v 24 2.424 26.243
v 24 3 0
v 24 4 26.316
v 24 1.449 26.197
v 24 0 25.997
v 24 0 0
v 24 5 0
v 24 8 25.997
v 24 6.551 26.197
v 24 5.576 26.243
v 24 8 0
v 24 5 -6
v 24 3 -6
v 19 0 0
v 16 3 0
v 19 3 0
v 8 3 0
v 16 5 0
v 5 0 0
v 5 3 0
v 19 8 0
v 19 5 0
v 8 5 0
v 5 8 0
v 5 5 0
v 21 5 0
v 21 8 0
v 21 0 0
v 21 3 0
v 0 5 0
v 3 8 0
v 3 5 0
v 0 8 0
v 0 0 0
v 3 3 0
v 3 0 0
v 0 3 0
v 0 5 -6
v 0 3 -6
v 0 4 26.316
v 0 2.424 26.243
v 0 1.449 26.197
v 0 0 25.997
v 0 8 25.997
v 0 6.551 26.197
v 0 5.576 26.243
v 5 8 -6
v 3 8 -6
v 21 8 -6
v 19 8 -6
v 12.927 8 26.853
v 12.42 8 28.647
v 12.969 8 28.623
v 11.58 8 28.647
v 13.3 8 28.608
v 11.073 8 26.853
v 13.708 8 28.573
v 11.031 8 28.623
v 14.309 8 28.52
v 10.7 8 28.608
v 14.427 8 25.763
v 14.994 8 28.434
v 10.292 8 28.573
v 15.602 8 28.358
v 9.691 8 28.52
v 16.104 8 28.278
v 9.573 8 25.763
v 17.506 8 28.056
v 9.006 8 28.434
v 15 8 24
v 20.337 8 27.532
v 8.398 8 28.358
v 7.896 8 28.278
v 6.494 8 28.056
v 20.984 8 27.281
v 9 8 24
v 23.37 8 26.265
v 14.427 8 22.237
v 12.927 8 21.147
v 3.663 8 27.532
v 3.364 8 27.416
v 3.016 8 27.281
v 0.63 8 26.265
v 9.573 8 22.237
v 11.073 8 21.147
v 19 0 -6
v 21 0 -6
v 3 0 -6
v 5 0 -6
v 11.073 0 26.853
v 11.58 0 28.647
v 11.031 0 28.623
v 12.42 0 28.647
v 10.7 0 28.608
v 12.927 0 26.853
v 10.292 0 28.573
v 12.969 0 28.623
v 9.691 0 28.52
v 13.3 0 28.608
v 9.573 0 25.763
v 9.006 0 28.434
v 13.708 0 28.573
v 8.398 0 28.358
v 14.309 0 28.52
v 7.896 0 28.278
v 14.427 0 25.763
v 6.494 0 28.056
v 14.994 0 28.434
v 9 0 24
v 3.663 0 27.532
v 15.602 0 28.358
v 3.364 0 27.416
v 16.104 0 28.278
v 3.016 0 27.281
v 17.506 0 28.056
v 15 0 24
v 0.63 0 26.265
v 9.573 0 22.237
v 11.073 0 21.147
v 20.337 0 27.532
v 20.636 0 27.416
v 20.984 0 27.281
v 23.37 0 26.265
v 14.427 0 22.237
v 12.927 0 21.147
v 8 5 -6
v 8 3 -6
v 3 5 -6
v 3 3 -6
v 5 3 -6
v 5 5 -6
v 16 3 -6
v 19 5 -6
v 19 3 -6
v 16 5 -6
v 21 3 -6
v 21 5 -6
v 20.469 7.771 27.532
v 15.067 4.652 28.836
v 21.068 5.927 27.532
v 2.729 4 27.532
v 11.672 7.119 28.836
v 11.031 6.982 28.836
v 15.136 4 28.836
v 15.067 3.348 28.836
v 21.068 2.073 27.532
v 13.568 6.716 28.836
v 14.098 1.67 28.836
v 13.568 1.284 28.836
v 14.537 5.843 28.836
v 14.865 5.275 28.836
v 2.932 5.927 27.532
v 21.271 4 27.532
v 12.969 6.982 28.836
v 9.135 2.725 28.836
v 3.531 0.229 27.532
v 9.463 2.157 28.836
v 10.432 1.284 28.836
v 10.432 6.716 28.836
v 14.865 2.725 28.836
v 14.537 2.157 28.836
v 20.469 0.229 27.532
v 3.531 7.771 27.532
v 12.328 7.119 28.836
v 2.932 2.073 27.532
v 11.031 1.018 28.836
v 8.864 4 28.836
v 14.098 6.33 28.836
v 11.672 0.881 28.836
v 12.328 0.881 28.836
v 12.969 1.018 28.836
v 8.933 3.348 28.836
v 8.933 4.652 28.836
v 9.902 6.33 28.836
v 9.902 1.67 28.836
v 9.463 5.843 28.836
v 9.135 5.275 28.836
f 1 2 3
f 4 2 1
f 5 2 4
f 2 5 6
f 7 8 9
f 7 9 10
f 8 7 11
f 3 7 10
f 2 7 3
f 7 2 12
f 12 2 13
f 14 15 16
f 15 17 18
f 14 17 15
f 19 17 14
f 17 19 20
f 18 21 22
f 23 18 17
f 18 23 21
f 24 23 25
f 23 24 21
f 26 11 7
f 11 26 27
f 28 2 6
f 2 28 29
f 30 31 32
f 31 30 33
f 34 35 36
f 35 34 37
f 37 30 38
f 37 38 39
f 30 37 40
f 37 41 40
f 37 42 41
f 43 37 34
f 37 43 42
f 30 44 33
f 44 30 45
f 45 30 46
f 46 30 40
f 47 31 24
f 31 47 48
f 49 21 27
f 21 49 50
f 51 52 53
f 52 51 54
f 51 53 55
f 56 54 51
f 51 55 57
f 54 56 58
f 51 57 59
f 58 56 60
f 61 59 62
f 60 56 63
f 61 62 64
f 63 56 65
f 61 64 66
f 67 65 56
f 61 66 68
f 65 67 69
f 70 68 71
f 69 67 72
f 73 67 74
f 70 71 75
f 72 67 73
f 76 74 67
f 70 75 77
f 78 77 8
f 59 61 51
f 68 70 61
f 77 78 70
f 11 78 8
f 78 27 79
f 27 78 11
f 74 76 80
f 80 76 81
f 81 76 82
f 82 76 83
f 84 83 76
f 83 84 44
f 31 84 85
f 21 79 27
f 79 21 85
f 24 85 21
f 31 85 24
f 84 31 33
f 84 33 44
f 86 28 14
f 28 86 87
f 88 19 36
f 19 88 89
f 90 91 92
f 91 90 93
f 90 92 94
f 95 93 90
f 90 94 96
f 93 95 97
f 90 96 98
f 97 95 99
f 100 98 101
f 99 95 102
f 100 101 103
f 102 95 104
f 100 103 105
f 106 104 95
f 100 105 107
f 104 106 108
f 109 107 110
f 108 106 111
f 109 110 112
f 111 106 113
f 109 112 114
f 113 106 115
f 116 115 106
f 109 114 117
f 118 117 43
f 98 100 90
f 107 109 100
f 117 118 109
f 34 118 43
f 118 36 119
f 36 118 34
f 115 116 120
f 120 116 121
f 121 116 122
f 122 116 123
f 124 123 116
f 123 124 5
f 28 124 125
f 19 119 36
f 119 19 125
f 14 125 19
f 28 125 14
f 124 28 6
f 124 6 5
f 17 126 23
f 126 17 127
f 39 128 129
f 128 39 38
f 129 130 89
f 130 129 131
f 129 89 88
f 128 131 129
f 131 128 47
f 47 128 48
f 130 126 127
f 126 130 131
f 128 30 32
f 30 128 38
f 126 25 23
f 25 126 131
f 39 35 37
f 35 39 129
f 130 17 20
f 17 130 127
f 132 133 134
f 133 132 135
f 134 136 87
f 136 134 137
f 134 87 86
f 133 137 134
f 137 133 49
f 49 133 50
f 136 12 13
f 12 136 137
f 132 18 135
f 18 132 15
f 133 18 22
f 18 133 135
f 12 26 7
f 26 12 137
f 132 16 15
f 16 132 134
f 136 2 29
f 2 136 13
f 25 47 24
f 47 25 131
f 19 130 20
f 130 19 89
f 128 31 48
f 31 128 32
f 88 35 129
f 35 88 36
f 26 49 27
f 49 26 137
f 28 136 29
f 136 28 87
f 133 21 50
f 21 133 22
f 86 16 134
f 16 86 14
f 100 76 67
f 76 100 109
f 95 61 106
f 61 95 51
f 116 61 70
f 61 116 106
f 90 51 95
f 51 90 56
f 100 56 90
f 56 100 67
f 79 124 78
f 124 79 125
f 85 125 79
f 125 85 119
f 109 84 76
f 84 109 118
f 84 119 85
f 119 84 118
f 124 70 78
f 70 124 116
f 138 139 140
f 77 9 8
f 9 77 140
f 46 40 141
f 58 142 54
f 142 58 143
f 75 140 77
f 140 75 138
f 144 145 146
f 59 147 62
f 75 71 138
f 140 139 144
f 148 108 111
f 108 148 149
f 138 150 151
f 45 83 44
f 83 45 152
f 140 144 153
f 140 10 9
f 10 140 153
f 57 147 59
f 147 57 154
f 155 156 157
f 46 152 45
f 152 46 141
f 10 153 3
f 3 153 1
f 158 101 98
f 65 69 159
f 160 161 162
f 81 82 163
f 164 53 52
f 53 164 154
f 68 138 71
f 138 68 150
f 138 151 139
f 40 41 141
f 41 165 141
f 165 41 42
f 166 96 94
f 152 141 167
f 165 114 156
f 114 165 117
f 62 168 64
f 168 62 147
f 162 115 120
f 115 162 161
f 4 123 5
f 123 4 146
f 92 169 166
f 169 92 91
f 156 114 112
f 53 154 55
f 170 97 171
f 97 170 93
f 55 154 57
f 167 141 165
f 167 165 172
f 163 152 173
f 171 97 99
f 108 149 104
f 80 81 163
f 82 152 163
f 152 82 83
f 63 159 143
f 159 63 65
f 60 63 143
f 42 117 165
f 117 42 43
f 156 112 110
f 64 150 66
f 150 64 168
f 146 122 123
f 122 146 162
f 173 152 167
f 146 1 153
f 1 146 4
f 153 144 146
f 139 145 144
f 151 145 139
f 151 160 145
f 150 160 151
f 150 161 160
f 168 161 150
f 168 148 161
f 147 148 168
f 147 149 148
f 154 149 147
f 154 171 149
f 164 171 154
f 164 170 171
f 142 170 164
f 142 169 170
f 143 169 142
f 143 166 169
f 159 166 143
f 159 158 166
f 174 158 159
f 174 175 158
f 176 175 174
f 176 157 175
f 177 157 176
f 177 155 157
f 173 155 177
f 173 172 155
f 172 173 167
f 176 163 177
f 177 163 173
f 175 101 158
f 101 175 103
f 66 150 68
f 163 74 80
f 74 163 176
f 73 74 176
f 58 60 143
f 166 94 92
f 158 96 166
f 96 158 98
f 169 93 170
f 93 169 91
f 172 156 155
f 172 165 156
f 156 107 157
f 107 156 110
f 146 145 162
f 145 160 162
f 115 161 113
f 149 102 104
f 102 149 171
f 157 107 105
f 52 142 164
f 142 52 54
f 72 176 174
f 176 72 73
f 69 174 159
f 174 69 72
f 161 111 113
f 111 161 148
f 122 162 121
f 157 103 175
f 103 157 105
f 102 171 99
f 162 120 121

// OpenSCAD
width= 24;
thickness = 8;
length = 30;
cross_thickness = 2;
cross_length = 6;
cross_width = thickness;
hole_rayon = 3;
intersection(){
difference()
{
union()
{
    cube([width, thickness, length], center = false);
    translate([0,4-cross_thickness/2,-cross_length])
        cube([cross_width, cross_thickness, cross_length]);
    translate([width-8,4-cross_thickness/2,-cross_length])
        cube([cross_width, cross_thickness, cross_length]);
    translate([cross_width/2-cross_thickness/2,0,-cross_length])
        cube([cross_thickness, cross_width, cross_length]);
    translate([width-cross_width/2-cross_thickness/2,0,-cross_length])
        cube([cross_thickness, cross_width, cross_length]);
}
translate([width/2, thickness+1, length-hole_rayon-3])
    rotate([90,0,0])
      cylinder(h=thickness+2, r=hole_rayon);
}
translate([width/2,thickness/2, -1])
    sphere(r=length);
}
